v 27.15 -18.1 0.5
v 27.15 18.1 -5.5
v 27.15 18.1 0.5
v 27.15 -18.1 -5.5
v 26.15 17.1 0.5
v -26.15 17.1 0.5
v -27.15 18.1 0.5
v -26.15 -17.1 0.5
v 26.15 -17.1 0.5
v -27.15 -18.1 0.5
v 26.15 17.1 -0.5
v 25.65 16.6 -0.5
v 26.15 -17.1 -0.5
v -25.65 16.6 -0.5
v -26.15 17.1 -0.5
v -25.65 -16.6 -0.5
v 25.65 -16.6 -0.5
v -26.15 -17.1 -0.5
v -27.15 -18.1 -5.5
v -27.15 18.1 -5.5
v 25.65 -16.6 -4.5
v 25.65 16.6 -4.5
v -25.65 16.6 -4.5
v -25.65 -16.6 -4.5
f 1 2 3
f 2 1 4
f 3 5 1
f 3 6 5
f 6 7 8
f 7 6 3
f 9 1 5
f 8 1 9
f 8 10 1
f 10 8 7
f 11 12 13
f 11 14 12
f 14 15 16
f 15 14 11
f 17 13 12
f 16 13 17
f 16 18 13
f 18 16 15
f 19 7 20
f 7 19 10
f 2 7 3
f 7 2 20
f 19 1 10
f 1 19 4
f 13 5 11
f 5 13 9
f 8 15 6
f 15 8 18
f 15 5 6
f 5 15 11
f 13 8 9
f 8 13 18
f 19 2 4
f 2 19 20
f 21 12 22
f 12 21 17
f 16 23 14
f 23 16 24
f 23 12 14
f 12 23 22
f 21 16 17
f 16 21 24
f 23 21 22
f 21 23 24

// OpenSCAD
// 52.11
// 34.2
// 15 h

w=53.3;
l=35.2;
h=1;
hh=5;

difference() {
  cube([w+1, l+1, h], center=true);
  cube([w-1, l-1, h], center=true);
}
translate([0,0,-3]) {
  difference() {
    cube([w+1, l+1, hh], center=true);
    cube([w-2, l-2, hh], center=true);
  }
}
translate([0,0,-5.0]) {
  cube([w, l, 1], center=true);
}

///

// translate([0,l*1.5,-(hh-1.5)]) {
  // difference() {
  //   cube([w+3.5, l+3.5, h+2], center=true);
  //   cube([w+1.5, l+1.5, h+2], center=true);
  // }
  // translate([0,0,-1.5]) {
  //   difference() {
  //     cube([w+1.5, l+1.5, 1], center=true);
  //     cube([w-1, l-1, 1], center=true);
  //   }
  // }
// }
